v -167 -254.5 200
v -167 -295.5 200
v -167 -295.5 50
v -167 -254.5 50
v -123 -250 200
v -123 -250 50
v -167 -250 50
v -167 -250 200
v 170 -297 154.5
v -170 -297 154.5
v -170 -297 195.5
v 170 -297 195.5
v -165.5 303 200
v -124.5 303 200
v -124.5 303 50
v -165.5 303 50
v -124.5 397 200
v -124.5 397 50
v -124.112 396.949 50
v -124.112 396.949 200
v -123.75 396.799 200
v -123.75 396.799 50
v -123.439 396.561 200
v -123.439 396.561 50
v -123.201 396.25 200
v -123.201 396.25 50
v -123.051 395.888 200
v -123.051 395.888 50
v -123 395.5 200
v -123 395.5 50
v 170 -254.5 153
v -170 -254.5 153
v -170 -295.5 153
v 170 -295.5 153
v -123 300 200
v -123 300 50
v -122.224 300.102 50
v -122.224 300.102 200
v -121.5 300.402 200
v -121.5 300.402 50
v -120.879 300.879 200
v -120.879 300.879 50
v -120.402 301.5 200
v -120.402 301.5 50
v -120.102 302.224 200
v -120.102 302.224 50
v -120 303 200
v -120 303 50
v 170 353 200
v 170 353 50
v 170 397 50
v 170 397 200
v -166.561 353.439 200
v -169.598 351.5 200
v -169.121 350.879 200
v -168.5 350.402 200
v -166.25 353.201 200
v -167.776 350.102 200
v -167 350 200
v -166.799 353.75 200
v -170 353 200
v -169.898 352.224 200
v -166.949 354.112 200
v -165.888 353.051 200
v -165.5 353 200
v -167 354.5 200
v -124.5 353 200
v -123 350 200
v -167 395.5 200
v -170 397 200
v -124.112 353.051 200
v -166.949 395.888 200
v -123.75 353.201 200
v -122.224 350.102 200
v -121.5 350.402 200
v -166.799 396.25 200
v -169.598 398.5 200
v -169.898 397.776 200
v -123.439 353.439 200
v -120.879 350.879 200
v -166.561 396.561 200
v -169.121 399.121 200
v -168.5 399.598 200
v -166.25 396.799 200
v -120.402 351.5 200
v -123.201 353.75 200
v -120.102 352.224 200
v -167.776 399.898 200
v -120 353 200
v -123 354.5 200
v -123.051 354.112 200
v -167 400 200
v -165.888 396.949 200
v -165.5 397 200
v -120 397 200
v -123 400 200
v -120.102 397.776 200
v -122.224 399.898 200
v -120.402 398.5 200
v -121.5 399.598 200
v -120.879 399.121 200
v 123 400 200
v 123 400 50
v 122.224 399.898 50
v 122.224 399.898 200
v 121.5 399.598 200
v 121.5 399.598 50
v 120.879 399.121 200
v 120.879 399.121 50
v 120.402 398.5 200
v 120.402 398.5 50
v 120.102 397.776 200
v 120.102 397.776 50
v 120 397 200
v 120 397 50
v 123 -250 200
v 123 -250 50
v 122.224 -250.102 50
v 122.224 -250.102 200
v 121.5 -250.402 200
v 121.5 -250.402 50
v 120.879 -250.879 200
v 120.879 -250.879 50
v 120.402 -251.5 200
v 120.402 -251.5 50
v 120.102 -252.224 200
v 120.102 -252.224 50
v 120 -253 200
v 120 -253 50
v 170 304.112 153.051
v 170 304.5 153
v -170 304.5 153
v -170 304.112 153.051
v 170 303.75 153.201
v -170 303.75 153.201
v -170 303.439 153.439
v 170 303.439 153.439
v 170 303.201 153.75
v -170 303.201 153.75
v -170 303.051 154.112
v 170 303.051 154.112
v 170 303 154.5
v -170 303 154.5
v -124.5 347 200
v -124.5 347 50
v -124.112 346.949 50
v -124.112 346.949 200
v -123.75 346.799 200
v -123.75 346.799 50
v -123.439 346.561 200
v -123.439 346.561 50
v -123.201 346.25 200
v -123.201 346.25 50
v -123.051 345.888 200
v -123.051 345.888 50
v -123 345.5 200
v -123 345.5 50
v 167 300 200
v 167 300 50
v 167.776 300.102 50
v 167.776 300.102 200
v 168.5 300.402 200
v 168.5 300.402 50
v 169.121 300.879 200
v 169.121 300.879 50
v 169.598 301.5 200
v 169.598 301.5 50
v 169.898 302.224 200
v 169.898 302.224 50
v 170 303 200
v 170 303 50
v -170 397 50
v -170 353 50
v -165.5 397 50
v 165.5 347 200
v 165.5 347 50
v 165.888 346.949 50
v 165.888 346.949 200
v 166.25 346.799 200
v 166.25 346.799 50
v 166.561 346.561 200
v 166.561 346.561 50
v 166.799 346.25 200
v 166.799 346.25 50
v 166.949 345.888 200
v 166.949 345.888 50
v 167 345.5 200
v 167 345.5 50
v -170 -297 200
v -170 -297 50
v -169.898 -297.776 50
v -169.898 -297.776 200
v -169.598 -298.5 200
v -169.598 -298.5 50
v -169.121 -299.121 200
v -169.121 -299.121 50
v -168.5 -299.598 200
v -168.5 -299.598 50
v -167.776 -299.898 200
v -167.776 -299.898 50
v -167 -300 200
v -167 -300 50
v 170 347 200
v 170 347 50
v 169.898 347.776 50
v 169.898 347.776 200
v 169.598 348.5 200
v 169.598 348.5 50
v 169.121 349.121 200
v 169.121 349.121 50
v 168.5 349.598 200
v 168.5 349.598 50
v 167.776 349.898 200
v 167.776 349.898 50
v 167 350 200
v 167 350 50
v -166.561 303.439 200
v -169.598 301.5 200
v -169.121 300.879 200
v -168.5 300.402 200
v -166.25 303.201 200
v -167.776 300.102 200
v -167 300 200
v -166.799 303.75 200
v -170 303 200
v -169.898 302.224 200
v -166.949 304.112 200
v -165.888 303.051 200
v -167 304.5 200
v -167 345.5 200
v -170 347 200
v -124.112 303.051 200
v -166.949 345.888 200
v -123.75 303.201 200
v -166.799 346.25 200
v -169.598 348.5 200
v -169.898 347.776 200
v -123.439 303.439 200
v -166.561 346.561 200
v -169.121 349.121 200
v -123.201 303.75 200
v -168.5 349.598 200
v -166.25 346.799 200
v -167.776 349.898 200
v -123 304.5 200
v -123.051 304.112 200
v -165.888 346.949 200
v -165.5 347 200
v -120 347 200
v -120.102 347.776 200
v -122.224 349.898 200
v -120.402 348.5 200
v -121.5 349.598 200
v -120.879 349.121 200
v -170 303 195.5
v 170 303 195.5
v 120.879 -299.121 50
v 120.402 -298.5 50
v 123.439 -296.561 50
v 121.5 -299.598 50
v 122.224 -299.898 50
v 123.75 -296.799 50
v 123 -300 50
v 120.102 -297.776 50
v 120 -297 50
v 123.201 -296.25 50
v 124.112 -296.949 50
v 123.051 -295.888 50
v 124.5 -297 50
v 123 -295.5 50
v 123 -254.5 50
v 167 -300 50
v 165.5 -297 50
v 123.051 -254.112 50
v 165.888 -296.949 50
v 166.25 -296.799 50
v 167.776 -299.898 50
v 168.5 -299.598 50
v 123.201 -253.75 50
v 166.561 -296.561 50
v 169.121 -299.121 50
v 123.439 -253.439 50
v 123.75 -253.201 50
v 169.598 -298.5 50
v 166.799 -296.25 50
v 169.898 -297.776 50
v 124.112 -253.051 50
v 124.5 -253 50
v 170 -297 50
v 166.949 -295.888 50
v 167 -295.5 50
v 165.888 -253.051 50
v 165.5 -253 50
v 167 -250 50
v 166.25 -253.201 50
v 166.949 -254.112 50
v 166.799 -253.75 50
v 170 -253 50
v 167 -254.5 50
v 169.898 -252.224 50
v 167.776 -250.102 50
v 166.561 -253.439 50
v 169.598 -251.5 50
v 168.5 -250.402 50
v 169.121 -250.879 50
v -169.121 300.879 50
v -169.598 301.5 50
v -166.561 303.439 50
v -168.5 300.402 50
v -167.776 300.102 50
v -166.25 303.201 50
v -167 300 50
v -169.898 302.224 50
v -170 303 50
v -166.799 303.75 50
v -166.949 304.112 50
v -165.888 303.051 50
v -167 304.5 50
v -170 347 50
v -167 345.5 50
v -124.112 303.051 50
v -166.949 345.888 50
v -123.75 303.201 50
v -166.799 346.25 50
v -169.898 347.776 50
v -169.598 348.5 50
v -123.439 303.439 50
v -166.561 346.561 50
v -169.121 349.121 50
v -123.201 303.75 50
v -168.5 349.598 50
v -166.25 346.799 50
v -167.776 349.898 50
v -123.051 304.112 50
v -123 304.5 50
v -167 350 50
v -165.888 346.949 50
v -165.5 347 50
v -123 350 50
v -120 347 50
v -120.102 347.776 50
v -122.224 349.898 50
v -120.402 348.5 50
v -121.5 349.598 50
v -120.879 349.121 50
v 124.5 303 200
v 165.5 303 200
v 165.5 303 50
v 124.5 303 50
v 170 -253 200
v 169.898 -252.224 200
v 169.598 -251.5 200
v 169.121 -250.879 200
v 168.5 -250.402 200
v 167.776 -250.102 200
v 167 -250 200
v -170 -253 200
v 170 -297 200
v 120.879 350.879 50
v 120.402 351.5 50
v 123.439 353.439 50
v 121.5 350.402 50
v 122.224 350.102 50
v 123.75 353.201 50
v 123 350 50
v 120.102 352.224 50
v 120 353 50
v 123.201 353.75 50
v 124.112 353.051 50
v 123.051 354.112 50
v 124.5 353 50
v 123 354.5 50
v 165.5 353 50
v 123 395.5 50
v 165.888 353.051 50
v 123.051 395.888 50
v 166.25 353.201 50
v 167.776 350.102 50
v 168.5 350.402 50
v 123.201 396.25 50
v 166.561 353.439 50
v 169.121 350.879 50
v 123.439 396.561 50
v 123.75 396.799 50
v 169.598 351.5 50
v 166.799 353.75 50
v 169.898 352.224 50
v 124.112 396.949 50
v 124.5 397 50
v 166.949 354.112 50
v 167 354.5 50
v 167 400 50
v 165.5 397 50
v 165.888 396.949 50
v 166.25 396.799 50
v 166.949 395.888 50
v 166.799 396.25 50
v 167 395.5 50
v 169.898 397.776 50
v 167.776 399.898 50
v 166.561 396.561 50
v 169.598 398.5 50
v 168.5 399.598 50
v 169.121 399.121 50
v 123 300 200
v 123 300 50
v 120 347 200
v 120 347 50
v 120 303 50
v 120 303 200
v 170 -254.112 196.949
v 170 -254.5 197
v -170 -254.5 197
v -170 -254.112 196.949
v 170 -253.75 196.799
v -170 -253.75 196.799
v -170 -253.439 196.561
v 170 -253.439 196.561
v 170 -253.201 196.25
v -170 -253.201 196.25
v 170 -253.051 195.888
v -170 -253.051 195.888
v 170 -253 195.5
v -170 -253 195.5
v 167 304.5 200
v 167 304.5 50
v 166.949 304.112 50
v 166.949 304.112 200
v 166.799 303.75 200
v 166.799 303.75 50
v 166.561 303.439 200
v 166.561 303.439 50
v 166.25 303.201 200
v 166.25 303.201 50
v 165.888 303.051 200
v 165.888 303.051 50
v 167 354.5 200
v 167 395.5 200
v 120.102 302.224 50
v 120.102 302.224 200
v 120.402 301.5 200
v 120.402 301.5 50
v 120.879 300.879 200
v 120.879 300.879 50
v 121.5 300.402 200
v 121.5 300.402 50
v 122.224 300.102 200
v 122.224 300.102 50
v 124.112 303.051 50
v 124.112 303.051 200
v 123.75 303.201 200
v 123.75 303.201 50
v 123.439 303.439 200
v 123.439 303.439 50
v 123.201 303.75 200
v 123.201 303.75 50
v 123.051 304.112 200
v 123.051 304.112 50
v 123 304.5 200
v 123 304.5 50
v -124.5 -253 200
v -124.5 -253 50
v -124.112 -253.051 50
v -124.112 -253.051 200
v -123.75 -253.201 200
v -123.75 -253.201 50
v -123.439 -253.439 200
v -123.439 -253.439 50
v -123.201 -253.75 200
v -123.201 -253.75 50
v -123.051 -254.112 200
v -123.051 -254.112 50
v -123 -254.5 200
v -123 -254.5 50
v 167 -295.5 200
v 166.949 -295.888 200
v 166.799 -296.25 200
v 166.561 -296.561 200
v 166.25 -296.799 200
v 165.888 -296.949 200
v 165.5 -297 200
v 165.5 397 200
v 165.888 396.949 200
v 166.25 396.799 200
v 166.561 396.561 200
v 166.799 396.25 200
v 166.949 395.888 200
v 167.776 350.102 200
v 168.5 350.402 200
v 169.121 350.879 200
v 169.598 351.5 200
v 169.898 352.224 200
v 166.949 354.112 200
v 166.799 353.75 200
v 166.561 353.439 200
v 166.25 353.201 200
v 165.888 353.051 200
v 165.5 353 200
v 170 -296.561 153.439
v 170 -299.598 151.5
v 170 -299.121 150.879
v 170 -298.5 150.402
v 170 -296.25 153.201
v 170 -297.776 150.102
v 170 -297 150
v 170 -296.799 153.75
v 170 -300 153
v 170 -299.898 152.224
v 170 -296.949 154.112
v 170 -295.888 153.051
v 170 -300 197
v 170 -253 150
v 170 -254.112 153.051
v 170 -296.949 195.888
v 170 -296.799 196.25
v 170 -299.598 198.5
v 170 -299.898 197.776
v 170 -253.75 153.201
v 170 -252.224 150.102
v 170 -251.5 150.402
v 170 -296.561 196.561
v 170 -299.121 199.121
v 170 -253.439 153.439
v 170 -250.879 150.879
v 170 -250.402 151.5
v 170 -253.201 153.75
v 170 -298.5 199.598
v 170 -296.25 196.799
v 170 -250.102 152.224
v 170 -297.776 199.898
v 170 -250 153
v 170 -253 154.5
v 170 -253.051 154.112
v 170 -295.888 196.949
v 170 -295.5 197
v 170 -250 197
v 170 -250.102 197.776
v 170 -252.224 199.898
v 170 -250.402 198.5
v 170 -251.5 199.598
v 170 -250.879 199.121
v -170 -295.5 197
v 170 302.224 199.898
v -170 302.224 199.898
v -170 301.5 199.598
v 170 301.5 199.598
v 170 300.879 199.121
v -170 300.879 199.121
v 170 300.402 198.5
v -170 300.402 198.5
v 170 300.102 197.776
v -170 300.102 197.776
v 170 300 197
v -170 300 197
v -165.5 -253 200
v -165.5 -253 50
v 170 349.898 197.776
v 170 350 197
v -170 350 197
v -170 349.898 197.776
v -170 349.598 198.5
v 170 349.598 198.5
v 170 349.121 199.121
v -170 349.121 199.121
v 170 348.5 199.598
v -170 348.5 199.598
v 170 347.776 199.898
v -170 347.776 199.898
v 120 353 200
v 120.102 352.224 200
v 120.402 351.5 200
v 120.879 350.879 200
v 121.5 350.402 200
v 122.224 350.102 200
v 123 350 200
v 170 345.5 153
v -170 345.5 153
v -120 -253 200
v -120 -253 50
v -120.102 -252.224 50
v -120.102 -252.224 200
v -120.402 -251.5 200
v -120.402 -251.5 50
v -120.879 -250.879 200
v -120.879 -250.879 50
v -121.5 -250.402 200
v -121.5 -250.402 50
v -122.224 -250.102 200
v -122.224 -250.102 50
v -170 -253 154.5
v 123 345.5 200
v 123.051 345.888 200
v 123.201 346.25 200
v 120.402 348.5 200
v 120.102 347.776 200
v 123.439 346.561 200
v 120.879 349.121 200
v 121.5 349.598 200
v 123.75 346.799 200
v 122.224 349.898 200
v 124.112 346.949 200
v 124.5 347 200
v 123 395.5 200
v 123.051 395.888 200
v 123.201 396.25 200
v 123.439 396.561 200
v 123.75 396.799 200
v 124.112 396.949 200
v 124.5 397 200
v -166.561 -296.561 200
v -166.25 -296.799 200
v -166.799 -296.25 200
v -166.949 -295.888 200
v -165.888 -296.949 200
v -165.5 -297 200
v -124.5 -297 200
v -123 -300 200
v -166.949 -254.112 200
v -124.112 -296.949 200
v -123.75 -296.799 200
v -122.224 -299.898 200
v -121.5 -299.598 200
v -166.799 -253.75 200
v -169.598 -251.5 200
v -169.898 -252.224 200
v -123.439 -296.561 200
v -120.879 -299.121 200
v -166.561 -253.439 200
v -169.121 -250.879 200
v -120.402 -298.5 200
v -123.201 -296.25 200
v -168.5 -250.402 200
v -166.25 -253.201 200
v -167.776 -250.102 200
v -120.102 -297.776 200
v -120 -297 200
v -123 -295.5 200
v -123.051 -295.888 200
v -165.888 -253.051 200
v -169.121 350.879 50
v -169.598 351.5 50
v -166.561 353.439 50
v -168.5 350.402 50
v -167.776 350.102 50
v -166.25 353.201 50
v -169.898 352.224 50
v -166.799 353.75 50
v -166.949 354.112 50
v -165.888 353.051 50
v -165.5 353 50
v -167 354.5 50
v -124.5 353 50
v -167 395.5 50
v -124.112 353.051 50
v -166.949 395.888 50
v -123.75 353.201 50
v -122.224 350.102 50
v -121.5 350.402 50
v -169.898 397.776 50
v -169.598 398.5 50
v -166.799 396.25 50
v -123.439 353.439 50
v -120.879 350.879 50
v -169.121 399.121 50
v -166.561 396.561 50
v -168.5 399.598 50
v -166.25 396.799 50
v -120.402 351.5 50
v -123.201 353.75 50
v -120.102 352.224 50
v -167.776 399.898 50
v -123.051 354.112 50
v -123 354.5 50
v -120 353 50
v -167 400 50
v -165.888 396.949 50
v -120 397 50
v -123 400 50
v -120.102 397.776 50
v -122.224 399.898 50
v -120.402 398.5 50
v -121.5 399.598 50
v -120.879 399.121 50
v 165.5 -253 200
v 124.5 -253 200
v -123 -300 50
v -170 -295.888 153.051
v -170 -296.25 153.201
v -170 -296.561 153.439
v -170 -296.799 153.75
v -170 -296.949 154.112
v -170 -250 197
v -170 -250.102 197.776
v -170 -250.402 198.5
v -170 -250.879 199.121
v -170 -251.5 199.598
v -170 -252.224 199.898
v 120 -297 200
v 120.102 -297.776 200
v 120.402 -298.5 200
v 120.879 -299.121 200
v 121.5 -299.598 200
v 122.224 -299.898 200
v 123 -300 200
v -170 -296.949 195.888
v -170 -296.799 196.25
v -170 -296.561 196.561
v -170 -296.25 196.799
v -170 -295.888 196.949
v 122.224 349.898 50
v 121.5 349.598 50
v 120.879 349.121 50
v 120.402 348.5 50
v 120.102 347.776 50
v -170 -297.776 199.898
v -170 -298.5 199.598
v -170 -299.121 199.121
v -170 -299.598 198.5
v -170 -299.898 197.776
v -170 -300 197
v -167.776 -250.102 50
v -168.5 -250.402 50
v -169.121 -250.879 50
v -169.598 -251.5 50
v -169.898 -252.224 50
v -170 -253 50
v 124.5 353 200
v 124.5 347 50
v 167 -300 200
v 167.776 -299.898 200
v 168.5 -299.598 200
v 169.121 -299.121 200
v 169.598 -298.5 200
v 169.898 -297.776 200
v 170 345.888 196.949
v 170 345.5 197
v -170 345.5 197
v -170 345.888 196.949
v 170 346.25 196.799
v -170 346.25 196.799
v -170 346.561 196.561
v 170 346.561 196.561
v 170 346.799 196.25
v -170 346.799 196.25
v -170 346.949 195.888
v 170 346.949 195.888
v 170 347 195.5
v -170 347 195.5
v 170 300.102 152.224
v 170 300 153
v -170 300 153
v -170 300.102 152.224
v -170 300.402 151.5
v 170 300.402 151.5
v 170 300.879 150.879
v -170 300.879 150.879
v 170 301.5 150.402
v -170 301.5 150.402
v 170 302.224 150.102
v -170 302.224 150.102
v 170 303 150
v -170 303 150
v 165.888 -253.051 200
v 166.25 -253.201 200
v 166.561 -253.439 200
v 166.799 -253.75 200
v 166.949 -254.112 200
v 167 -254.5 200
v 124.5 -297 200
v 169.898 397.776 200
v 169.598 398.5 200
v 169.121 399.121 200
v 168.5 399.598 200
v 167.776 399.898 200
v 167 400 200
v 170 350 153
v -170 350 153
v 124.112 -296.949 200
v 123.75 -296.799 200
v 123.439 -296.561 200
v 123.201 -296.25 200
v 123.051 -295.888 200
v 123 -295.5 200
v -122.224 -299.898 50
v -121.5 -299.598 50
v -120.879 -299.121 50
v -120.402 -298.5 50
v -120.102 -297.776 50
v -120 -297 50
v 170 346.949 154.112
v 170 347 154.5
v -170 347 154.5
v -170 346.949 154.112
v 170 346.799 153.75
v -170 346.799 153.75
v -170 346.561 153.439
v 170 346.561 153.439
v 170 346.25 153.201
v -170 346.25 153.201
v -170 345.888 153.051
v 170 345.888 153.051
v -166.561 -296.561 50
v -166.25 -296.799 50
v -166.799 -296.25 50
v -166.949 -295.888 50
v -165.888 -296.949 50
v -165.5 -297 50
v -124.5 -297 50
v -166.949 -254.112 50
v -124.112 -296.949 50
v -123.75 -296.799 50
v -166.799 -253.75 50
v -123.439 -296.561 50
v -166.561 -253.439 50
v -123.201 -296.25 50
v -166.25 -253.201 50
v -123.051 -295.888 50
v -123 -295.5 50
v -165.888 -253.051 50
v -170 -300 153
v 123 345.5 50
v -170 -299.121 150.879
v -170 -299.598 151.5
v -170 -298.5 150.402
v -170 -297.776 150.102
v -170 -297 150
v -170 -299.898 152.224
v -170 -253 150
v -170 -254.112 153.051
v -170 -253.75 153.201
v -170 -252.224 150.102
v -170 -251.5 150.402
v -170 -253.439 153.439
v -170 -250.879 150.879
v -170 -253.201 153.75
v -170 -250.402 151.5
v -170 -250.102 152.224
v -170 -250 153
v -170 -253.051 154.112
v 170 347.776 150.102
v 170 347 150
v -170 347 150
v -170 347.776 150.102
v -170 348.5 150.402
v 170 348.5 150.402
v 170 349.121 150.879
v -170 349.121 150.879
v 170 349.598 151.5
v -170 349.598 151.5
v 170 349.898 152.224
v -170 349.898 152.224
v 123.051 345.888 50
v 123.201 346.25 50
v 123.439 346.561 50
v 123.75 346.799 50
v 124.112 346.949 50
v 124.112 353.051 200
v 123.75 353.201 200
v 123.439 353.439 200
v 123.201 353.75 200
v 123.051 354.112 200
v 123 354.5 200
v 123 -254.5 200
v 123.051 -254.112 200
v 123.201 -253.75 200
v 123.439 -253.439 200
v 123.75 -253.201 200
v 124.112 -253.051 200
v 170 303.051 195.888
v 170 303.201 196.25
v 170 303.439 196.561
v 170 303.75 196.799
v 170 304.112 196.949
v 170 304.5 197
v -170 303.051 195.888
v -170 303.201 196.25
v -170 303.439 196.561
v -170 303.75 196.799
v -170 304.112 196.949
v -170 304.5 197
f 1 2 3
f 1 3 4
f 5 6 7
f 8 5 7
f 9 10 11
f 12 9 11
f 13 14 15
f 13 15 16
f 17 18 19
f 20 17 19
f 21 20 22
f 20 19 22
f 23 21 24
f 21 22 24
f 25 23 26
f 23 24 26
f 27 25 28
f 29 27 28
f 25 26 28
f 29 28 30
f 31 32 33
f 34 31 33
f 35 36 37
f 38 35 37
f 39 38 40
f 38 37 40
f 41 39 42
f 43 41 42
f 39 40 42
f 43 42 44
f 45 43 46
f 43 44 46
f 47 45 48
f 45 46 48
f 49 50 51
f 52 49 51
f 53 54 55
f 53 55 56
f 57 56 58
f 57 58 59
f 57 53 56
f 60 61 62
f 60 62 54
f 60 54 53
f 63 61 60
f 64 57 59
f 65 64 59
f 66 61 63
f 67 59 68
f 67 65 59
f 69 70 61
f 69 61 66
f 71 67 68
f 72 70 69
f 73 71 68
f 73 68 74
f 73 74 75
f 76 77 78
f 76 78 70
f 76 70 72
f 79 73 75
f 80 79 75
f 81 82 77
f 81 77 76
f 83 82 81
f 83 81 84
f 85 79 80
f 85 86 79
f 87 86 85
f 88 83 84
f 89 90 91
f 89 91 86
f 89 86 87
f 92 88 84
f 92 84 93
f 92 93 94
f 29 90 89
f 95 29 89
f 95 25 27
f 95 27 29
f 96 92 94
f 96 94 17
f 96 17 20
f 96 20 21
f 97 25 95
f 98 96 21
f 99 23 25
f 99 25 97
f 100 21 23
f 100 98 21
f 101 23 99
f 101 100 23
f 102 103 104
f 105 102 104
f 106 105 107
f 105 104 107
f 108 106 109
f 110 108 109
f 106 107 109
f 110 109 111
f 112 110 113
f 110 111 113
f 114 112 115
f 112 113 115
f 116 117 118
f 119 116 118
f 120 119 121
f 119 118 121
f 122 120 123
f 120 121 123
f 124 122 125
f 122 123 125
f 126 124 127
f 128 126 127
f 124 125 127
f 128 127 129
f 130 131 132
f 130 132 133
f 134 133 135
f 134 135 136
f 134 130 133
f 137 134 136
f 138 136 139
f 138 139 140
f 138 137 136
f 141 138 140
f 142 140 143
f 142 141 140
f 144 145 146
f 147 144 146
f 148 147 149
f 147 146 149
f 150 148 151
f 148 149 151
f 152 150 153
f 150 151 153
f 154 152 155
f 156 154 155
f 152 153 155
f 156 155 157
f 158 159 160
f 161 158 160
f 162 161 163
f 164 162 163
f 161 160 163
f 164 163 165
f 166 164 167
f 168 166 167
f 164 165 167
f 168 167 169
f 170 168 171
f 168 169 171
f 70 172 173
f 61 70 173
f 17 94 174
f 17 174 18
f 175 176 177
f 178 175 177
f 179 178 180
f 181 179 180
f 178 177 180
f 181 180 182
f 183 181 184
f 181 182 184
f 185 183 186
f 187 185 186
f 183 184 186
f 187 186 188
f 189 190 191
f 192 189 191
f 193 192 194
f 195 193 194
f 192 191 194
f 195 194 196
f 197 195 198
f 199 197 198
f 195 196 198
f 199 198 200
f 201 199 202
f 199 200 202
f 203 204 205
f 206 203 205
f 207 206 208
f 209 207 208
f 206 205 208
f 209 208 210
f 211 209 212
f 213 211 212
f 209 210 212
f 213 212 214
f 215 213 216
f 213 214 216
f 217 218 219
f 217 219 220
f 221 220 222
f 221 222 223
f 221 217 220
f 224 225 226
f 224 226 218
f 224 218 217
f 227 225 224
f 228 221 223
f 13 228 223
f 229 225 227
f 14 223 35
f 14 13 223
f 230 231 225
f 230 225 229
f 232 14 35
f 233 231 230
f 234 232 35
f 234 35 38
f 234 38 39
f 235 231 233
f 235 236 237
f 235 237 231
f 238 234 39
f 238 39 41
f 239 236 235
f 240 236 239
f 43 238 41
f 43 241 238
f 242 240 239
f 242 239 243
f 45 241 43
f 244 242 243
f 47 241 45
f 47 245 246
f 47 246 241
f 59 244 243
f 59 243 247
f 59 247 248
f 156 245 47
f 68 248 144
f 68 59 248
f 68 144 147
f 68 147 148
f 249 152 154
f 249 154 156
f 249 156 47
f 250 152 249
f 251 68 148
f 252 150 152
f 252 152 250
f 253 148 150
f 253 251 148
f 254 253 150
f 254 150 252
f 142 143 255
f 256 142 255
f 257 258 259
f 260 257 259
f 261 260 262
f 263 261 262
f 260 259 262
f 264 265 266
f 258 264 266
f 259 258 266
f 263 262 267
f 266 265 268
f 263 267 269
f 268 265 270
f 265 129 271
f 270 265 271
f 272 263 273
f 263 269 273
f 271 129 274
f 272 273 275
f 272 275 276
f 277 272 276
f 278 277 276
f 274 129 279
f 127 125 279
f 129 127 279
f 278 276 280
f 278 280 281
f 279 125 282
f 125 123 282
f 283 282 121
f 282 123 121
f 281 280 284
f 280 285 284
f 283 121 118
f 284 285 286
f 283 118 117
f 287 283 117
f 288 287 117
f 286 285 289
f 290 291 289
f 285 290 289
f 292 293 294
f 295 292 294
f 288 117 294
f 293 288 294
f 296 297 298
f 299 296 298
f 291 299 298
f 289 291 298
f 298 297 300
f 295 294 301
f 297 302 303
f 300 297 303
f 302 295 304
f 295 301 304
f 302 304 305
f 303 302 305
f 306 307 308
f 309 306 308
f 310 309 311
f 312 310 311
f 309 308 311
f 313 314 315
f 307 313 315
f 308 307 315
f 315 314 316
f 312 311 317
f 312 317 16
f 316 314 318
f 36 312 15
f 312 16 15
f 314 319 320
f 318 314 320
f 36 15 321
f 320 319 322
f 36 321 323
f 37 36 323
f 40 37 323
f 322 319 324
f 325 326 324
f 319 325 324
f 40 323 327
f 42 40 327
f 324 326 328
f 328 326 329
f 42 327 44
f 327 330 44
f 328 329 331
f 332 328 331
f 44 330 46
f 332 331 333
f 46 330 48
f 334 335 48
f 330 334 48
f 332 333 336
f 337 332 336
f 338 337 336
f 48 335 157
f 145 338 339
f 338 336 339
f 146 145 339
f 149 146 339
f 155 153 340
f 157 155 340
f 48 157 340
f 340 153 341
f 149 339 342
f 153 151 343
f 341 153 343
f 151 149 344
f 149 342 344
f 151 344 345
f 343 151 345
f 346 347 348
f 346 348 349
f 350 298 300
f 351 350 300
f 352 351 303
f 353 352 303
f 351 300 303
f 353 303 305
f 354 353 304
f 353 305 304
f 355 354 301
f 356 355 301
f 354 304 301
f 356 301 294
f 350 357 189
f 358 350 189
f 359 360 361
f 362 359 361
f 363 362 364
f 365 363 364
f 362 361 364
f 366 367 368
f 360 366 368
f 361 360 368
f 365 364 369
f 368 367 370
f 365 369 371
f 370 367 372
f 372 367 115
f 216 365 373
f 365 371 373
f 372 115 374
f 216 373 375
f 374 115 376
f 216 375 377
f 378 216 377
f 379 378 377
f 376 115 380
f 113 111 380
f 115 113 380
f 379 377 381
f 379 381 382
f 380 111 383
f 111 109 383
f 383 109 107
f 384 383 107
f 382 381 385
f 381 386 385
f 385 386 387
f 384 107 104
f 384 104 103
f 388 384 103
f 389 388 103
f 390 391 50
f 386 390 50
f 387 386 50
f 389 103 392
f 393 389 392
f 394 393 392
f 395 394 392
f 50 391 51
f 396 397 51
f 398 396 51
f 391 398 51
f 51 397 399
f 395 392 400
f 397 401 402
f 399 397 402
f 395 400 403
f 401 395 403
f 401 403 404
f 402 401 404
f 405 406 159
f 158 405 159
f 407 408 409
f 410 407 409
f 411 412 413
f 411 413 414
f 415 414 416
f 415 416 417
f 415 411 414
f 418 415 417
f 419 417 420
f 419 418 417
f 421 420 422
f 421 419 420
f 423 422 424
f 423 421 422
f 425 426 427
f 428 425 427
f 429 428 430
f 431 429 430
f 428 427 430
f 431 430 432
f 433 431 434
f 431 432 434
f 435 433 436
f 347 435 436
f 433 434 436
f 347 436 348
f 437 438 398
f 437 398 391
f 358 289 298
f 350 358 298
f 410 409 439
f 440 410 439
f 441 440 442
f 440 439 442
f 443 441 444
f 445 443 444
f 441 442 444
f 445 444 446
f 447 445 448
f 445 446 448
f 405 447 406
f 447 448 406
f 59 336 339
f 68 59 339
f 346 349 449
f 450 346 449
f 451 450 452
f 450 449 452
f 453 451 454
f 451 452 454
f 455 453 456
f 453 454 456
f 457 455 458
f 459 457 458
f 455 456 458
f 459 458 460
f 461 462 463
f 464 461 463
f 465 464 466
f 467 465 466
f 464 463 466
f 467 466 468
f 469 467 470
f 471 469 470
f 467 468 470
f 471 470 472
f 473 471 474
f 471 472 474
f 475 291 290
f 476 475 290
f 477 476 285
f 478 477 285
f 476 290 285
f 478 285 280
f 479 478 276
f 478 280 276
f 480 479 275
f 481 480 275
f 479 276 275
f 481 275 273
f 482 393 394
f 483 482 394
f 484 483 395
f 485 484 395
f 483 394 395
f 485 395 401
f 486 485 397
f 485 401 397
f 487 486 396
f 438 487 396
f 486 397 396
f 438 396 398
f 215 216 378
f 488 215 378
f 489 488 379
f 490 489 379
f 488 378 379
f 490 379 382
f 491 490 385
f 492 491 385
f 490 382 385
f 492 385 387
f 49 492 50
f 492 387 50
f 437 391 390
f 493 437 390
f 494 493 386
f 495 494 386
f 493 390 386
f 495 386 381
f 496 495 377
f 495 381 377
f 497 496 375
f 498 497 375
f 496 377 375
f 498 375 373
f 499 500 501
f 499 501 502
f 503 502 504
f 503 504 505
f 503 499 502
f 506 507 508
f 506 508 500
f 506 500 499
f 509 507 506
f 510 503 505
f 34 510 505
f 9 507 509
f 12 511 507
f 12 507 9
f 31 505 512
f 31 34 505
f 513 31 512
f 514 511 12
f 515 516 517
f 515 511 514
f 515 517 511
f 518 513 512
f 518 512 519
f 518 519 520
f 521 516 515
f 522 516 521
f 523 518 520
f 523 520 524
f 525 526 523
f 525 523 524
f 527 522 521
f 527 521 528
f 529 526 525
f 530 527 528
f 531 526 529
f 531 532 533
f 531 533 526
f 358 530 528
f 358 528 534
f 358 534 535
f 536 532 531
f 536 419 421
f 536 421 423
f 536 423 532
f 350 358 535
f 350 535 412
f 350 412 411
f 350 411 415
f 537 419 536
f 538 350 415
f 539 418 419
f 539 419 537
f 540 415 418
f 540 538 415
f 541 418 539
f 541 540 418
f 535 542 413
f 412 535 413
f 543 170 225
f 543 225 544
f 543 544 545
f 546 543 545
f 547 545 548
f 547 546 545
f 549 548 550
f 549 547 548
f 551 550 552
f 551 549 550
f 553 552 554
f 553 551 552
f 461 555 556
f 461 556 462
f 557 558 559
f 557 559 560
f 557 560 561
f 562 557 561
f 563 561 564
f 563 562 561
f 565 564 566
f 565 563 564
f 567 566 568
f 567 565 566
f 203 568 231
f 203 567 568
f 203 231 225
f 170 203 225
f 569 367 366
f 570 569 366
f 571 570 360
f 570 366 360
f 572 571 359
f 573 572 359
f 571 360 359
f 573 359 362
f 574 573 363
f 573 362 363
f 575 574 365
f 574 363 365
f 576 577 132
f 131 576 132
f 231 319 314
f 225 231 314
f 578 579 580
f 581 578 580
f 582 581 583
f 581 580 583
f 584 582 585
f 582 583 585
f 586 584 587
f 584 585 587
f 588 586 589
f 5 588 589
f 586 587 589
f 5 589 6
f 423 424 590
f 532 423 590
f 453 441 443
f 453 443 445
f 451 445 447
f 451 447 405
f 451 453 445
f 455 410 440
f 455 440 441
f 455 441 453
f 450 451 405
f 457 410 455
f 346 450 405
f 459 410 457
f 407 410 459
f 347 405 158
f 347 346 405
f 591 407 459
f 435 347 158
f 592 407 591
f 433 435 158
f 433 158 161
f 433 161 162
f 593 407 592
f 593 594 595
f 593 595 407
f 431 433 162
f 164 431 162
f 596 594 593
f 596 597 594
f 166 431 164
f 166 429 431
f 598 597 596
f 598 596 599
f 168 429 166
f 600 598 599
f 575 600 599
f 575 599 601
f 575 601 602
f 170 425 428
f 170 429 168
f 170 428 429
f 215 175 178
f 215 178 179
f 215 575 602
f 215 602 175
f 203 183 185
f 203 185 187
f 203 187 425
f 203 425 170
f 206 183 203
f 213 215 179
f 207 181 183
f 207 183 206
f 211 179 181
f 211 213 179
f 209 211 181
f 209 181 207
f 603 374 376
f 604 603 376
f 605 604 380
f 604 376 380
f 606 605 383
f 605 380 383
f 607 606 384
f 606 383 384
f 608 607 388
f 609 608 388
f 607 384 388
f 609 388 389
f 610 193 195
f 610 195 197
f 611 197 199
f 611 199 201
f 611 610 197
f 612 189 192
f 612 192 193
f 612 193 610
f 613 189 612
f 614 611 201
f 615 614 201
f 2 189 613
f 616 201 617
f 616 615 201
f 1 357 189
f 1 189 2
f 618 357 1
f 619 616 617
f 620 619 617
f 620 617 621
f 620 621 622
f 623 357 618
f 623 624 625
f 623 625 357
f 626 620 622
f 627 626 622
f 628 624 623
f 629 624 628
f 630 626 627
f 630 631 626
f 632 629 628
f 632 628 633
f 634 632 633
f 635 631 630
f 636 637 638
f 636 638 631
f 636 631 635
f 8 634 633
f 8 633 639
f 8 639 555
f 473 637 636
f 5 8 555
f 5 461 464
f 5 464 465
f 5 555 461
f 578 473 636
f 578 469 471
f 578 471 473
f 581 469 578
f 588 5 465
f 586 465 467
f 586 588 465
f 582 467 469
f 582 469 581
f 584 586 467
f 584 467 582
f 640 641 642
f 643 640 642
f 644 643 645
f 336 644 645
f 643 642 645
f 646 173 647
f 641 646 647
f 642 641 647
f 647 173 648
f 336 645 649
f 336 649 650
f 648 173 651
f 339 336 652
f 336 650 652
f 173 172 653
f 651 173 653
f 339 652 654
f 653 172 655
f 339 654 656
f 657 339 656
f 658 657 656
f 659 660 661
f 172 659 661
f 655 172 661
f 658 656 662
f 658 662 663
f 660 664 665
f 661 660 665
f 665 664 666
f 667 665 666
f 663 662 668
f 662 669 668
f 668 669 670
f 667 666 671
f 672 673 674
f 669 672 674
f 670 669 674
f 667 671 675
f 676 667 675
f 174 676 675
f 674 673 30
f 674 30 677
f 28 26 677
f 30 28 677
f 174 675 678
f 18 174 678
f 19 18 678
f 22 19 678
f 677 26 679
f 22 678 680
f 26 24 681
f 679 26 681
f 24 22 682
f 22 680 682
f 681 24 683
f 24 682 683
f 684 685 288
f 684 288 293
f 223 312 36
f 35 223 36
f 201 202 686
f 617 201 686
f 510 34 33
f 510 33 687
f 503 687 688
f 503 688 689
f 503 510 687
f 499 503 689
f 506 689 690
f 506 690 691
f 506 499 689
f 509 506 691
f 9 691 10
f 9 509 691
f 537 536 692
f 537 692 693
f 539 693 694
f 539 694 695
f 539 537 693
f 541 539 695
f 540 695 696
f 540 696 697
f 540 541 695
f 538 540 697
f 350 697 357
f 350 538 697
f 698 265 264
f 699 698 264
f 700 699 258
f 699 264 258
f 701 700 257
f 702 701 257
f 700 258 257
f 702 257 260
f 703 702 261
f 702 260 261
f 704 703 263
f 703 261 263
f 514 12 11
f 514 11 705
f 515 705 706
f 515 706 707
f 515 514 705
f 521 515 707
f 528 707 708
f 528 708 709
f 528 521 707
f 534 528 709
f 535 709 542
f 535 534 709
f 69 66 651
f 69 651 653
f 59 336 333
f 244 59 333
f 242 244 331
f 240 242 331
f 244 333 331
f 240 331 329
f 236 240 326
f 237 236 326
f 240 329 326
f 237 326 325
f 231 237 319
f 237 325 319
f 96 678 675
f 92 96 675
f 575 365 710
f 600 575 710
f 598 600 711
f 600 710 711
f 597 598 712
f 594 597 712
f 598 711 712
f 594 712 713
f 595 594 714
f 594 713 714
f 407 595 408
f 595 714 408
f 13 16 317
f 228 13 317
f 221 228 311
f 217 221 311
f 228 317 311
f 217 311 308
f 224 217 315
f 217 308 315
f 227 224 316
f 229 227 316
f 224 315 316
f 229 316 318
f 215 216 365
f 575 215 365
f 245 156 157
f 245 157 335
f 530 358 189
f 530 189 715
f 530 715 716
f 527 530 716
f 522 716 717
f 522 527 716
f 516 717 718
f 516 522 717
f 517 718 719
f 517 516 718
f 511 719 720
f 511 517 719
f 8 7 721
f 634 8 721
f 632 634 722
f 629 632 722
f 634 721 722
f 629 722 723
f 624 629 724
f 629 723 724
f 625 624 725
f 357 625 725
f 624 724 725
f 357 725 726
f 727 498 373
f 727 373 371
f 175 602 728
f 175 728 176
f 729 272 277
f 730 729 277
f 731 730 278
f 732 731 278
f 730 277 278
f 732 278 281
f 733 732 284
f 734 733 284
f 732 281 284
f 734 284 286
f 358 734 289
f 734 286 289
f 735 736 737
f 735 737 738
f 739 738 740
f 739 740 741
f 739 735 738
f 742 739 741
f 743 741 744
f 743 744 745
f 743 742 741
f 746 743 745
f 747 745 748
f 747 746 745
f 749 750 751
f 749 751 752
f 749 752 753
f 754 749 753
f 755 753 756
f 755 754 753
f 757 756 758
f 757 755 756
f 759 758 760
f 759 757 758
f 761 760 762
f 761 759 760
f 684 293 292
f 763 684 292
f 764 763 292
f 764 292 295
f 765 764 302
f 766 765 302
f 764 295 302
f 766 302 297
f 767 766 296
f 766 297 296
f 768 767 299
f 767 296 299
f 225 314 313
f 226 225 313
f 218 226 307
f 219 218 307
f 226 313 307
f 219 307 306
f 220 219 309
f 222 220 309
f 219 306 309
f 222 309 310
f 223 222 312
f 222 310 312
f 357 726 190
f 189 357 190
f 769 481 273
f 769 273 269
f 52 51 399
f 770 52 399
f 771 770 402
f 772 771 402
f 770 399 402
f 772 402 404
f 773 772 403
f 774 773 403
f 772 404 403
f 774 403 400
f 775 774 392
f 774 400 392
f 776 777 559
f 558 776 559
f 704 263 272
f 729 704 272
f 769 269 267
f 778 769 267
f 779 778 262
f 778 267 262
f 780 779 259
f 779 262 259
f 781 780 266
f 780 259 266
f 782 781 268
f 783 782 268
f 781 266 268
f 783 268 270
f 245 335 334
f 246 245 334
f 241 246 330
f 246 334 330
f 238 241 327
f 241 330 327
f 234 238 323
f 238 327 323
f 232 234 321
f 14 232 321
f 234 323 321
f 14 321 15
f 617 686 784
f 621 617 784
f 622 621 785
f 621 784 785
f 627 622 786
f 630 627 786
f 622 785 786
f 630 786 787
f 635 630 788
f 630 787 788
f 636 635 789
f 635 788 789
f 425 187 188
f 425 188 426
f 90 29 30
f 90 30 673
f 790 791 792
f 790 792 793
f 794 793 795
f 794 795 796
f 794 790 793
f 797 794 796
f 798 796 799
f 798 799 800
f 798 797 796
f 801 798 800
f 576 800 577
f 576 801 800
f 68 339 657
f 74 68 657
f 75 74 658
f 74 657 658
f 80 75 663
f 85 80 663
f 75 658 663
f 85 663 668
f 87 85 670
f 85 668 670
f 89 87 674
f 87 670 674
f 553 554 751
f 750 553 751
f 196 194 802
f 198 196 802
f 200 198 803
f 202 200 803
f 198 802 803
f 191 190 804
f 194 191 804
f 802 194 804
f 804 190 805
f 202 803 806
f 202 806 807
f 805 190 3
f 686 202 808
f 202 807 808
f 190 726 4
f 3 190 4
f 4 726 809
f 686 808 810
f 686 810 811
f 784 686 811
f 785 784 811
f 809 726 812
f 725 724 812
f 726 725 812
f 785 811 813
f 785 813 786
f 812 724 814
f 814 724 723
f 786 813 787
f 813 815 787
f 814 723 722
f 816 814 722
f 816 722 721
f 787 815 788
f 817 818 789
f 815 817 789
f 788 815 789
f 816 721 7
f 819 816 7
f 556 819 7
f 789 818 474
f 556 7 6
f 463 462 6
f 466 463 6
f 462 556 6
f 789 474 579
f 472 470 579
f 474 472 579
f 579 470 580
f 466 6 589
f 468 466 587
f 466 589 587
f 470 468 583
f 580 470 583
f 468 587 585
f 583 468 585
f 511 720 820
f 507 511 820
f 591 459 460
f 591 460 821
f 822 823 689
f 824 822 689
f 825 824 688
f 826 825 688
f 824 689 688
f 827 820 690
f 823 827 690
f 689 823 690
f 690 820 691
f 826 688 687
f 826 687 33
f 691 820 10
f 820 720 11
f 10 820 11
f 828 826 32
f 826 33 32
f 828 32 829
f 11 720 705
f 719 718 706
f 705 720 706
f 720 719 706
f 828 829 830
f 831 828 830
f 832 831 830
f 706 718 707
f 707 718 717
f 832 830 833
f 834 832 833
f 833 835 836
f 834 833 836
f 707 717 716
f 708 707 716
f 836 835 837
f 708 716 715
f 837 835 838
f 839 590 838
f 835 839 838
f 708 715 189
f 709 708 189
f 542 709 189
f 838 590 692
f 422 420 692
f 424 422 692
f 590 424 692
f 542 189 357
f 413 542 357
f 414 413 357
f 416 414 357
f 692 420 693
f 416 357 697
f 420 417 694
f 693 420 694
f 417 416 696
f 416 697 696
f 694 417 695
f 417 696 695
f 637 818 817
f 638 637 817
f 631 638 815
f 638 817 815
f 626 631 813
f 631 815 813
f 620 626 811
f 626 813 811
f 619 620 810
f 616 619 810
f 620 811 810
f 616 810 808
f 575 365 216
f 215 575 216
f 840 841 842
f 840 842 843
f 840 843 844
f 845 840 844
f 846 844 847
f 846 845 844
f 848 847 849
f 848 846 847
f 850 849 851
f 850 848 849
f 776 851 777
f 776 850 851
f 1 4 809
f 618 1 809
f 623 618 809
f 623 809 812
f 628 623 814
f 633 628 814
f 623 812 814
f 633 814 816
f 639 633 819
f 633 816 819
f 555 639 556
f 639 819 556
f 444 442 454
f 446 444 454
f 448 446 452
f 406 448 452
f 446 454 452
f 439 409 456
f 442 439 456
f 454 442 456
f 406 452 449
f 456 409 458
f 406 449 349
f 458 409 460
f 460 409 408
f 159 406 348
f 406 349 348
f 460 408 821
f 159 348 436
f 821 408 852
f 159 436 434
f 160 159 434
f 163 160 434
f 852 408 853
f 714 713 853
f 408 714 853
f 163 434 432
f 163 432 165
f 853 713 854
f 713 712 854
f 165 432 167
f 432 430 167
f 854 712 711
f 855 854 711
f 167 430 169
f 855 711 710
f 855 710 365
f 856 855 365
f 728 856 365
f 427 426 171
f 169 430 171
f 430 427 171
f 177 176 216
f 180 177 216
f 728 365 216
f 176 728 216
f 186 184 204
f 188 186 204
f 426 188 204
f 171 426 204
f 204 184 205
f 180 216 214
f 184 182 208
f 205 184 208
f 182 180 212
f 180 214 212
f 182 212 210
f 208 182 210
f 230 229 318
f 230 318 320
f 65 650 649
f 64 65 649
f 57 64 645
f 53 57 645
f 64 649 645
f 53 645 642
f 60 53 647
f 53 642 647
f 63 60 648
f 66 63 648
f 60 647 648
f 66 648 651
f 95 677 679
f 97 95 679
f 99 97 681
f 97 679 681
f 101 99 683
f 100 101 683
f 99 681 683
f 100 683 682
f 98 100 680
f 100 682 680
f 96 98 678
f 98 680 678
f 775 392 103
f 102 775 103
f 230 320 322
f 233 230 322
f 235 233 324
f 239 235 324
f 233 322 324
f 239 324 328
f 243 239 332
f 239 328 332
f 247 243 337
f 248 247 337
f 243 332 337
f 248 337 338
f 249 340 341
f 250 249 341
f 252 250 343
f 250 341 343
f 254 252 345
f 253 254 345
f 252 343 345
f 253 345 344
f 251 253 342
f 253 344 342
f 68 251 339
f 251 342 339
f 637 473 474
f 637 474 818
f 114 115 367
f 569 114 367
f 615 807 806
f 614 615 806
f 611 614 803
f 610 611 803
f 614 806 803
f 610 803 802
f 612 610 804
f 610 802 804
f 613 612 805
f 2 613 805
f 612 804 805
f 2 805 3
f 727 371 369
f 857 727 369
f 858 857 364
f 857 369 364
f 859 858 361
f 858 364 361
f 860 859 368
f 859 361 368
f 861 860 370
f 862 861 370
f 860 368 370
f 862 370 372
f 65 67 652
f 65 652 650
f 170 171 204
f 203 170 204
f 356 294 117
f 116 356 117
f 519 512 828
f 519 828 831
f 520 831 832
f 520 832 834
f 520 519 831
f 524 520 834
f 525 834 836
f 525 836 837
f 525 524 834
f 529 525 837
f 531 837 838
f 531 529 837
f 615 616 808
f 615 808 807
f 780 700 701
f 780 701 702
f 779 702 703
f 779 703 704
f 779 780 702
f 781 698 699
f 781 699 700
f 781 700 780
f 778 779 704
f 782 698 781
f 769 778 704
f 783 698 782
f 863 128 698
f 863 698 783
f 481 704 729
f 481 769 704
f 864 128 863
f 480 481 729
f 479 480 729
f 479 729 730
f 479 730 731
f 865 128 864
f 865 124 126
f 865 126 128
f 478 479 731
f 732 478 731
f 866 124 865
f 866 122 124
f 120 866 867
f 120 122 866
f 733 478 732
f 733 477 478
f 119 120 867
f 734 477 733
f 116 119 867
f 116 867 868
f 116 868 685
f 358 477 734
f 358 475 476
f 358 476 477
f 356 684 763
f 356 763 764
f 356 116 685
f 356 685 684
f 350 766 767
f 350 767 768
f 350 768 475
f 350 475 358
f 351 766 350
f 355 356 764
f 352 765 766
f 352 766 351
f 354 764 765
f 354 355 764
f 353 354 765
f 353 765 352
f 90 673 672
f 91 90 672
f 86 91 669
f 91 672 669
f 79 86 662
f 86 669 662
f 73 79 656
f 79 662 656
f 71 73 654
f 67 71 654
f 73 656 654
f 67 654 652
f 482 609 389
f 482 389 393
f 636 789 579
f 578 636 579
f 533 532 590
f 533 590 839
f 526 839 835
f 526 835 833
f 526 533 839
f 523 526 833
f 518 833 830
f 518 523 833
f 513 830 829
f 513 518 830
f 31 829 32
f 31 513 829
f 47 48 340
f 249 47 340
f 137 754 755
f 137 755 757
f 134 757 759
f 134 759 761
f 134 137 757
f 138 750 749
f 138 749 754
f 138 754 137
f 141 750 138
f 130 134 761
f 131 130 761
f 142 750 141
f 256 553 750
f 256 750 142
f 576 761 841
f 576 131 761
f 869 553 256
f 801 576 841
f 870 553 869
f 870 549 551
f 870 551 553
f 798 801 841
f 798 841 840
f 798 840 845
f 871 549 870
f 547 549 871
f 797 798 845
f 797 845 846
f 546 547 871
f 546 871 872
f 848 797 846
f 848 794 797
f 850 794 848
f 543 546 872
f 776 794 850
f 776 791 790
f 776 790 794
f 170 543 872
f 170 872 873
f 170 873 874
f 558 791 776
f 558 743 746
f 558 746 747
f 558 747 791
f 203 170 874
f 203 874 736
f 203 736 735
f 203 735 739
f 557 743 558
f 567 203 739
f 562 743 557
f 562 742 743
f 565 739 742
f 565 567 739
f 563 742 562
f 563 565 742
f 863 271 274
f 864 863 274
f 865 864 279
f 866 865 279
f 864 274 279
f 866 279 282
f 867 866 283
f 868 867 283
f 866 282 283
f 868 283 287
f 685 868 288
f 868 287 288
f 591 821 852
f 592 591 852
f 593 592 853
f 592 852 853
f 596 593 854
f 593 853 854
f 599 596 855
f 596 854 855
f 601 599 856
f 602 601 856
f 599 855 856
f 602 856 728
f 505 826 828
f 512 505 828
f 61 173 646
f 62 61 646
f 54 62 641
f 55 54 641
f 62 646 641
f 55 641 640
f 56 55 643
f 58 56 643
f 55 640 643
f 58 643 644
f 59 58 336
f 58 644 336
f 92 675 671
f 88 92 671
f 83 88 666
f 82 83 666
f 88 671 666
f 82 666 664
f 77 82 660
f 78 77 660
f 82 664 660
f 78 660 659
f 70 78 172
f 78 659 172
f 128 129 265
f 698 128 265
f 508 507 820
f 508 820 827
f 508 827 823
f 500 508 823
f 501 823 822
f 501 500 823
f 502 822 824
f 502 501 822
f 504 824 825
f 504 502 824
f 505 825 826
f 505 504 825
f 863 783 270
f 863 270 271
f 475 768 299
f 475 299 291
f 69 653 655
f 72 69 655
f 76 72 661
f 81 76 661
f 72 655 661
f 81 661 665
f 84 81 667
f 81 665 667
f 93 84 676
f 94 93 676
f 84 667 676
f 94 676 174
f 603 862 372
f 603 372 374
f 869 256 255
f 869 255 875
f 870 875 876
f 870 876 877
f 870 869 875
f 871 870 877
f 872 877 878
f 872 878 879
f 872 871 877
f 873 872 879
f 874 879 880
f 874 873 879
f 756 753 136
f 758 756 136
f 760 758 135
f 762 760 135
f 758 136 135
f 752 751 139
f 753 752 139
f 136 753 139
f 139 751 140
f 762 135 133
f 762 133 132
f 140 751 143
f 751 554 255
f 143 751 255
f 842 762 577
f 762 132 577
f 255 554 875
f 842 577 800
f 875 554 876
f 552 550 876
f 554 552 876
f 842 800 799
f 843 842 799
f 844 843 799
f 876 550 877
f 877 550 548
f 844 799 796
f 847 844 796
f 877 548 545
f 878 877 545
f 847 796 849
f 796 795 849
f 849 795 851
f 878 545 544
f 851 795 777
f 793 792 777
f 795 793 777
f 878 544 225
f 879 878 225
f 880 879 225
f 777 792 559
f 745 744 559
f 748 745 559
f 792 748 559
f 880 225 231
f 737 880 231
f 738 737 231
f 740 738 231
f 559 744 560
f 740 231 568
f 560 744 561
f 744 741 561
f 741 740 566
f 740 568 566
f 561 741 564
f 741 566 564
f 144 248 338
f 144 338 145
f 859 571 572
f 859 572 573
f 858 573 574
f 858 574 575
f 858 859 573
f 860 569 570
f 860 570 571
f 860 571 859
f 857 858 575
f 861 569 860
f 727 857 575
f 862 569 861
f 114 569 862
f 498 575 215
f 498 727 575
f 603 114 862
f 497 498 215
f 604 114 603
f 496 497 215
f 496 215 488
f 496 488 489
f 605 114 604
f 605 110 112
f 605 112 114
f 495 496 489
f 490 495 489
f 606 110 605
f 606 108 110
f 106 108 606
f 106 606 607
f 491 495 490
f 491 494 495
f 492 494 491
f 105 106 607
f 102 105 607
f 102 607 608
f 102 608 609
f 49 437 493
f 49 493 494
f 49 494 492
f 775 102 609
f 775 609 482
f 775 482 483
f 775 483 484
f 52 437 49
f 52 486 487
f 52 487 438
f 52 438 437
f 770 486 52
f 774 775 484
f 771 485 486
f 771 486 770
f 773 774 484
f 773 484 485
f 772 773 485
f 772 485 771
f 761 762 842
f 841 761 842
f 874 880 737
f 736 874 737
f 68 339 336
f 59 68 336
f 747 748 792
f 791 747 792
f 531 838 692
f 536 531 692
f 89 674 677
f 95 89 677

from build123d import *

# Parameters (mm, degrees)
F2_DEPTH = 150
F5_DEPTH = 340
F7_DEPTH = 150


with BuildPart() as f2:
    # F1 (on offset) → F2 (new body)
    with BuildSketch(Plane.XY.offset(50)):
        with BuildLine():
            ThreePointArc((-170, -297), (-169.12132, -299.12132), (-167, -300))
            Line((-167, -300), (-123, -300))
            ThreePointArc((-123, -300), (-120.87868, -299.12132), (-120, -297))
            Line((-120, -297), (-120, -253))
            ThreePointArc((-120, -253), (-120.87868, -250.87868), (-123, -250))
            Line((-123, -250), (-167, -250))
            ThreePointArc((-167, -250), (-169.12132, -250.87868), (-170, -253))
            Line((-170, -253), (-170, -297))
        make_face()
        with BuildLine():
            Line((-123, -254.5), (-123, -295.5))
            ThreePointArc((-123, -295.5), (-123.43934, -296.56066), (-124.5, -297))
            Line((-124.5, -297), (-165.5, -297))
            ThreePointArc((-165.5, -297), (-166.56066, -296.56066), (-167, -295.5))
            Line((-167, -295.5), (-167, -254.5))
            ThreePointArc((-167, -254.5), (-166.56066, -253.43934), (-165.5, -253))
            Line((-165.5, -253), (-124.5, -253))
            ThreePointArc((-124.5, -253), (-123.43934, -253.43934), (-123, -254.5))
        make_face(mode=Mode.SUBTRACT)
        with BuildLine():
            ThreePointArc((120, -297), (120.87868, -299.12132), (123, -300))
            Line((123, -300), (167, -300))
            ThreePointArc((167, -300), (169.12132, -299.12132), (170, -297))
            Line((170, -297), (170, -253))
            ThreePointArc((170, -253), (169.12132, -250.87868), (167, -250))
            Line((167, -250), (123, -250))
            ThreePointArc((123, -250), (120.87868, -250.87868), (120, -253))
            Line((120, -253), (120, -297))
        make_face()
        with BuildLine():
            Line((167, -254.5), (167, -295.5))
            ThreePointArc((167, -295.5), (166.56066, -296.56066), (165.5, -297))
            Line((165.5, -297), (124.5, -297))
            ThreePointArc((124.5, -297), (123.43934, -296.56066), (123, -295.5))
            Line((123, -295.5), (123, -254.5))
            ThreePointArc((123, -254.5), (123.43934, -253.43934), (124.5, -253))
            Line((124.5, -253), (165.5, -253))
            ThreePointArc((165.5, -253), (166.56066, -253.43934), (167, -254.5))
        make_face(mode=Mode.SUBTRACT)
        with BuildLine():
            ThreePointArc((-170, 303), (-169.12132, 300.87868), (-167, 300))
            Line((-167, 300), (-123, 300))
            ThreePointArc((-123, 300), (-120.87868, 300.87868), (-120, 303))
            Line((-120, 303), (-120, 347))
            ThreePointArc((-120, 347), (-120.87868, 349.12132), (-123, 350))
            Line((-123, 350), (-167, 350))
            ThreePointArc((-167, 350), (-169.12132, 349.12132), (-170, 347))
            Line((-170, 347), (-170, 303))
        make_face()
        with BuildLine():
            ThreePointArc((-165.5, 303), (-166.56066, 303.43934), (-167, 304.5))
            Line((-167, 304.5), (-167, 345.5))
            ThreePointArc((-167, 345.5), (-166.56066, 346.56066), (-165.5, 347))
            Line((-165.5, 347), (-124.5, 347))
            ThreePointArc((-124.5, 347), (-123.43934, 346.56066), (-123, 345.5))
            Line((-123, 345.5), (-123, 304.5))
            ThreePointArc((-123, 304.5), (-123.43934, 303.43934), (-124.5, 303))
            Line((-124.5, 303), (-165.5, 303))
        make_face(mode=Mode.SUBTRACT)
        with BuildLine():
            ThreePointArc((120, 303), (120.87868, 300.87868), (123, 300))
            Line((123, 300), (167, 300))
            ThreePointArc((167, 300), (169.12132, 300.87868), (170, 303))
            Line((170, 303), (170, 347))
            ThreePointArc((170, 347), (169.12132, 349.12132), (167, 350))
            Line((167, 350), (123, 350))
            ThreePointArc((123, 350), (120.87868, 349.12132), (120, 347))
            Line((120, 347), (120, 303))
        make_face()
        with BuildLine():
            Line((167, 345.5), (167, 304.5))
            ThreePointArc((167, 304.5), (166.56066, 303.43934), (165.5, 303))
            Line((165.5, 303), (124.5, 303))
            ThreePointArc((124.5, 303), (123.43934, 303.43934), (123, 304.5))
            Line((123, 304.5), (123, 345.5))
            ThreePointArc((123, 345.5), (123.43934, 346.56066), (124.5, 347))
            Line((124.5, 347), (165.5, 347))
            ThreePointArc((165.5, 347), (166.56066, 346.56066), (167, 345.5))
        make_face(mode=Mode.SUBTRACT)
    extrude(amount=F2_DEPTH)


with BuildPart() as f5:
    # F4 (on offset) → F5 (new body)
    with BuildSketch(Plane.YZ.offset(170)):
        with BuildLine():
            Line((-253, 200), (-297, 200))
            ThreePointArc((-297, 200), (-299.12132, 199.12132), (-300, 197))
            Line((-300, 197), (-300, 153))
            ThreePointArc((-300, 153), (-299.12132, 150.87868), (-297, 150))
            Line((-297, 150), (-253, 150))
            ThreePointArc((-253, 150), (-250.87868, 150.87868), (-250, 153))
            Line((-250, 153), (-250, 197))
            ThreePointArc((-250, 197), (-250.87868, 199.12132), (-253, 200))
        make_face()
        with BuildLine():
            Line((-297, 154.5), (-297, 195.5))
            ThreePointArc((-297, 195.5), (-296.56066, 196.56066), (-295.5, 197))
            Line((-295.5, 197), (-254.5, 197))
            ThreePointArc((-254.5, 197), (-253.43934, 196.56066), (-253, 195.5))
            Line((-253, 195.5), (-253, 154.5))
            ThreePointArc((-253, 154.5), (-253.43934, 153.43934), (-254.5, 153))
            Line((-254.5, 153), (-295.5, 153))
            ThreePointArc((-295.5, 153), (-296.56066, 153.43934), (-297, 154.5))
        make_face(mode=Mode.SUBTRACT)
        with BuildLine():
            Line((347, 200), (303, 200))
            ThreePointArc((303, 200), (300.87868, 199.12132), (300, 197))
            Line((300, 197), (300, 153))
            ThreePointArc((300, 153), (300.87868, 150.87868), (303, 150))
            Line((303, 150), (347, 150))
            ThreePointArc((347, 150), (349.12132, 150.87868), (350, 153))
            Line((350, 153), (350, 197))
            ThreePointArc((350, 197), (349.12132, 199.12132), (347, 200))
        make_face()
        with BuildLine():
            Line((303, 154.5), (303, 195.5))
            ThreePointArc((303, 195.5), (303.43934, 196.56066), (304.5, 197))
            Line((304.5, 197), (345.5, 197))
            ThreePointArc((345.5, 197), (346.56066, 196.56066), (347, 195.5))
            Line((347, 195.5), (347, 154.5))
            ThreePointArc((347, 154.5), (346.56066, 153.43934), (345.5, 153))
            Line((345.5, 153), (304.5, 153))
            ThreePointArc((304.5, 153), (303.43934, 153.43934), (303, 154.5))
        make_face(mode=Mode.SUBTRACT)
    extrude(amount=-F5_DEPTH)


with BuildPart() as f7:
    # F6 (on offset) → F7 (new body)
    with BuildSketch(Plane.XY.offset(50)):
        with BuildLine():
            Line((-123, 400), (-167, 400))
            ThreePointArc((-167, 400), (-169.12132, 399.12132), (-170, 397))
            Line((-170, 397), (-170, 353))
            ThreePointArc((-170, 353), (-169.12132, 350.87868), (-167, 350))
            Line((-167, 350), (-123, 350))
            ThreePointArc((-123, 350), (-120.87868, 350.87868), (-120, 353))
            Line((-120, 353), (-120, 397))
            ThreePointArc((-120, 397), (-120.87868, 399.12132), (-123, 400))
        make_face()
        with BuildLine():
            Line((-124.5, 353), (-165.5, 353))
            ThreePointArc((-165.5, 353), (-166.56066, 353.43934), (-167, 354.5))
            Line((-167, 354.5), (-167, 395.5))
            ThreePointArc((-167, 395.5), (-166.56066, 396.56066), (-165.5, 397))
            Line((-165.5, 397), (-124.5, 397))
            ThreePointArc((-124.5, 397), (-123.43934, 396.56066), (-123, 395.5))
            Line((-123, 395.5), (-123, 354.5))
            ThreePointArc((-123, 354.5), (-123.43934, 353.43934), (-124.5, 353))
        make_face(mode=Mode.SUBTRACT)
        with BuildLine():
            ThreePointArc((120, 353), (120.87868, 350.87868), (123, 350))
            Line((123, 350), (167, 350))
            ThreePointArc((167, 350), (169.12132, 350.87868), (170, 353))
            Line((170, 353), (170, 397))
            ThreePointArc((170, 397), (169.12132, 399.12132), (167, 400))
            Line((167, 400), (123, 400))
            ThreePointArc((123, 400), (120.87868, 399.12132), (120, 397))
            Line((120, 397), (120, 353))
        make_face()
        with BuildLine():
            Line((165.5, 353), (124.5, 353))
            ThreePointArc((124.5, 353), (123.43934, 353.43934), (123, 354.5))
            Line((123, 354.5), (123, 395.5))
            ThreePointArc((123, 395.5), (123.43934, 396.56066), (124.5, 397))
            Line((124.5, 397), (165.5, 397))
            ThreePointArc((165.5, 397), (166.56066, 396.56066), (167, 395.5))
            Line((167, 395.5), (167, 354.5))
            ThreePointArc((167, 354.5), (166.56066, 353.43934), (165.5, 353))
        make_face(mode=Mode.SUBTRACT)
    extrude(amount=F7_DEPTH)


solid = Compound([f2.part, f5.part, f7.part])
